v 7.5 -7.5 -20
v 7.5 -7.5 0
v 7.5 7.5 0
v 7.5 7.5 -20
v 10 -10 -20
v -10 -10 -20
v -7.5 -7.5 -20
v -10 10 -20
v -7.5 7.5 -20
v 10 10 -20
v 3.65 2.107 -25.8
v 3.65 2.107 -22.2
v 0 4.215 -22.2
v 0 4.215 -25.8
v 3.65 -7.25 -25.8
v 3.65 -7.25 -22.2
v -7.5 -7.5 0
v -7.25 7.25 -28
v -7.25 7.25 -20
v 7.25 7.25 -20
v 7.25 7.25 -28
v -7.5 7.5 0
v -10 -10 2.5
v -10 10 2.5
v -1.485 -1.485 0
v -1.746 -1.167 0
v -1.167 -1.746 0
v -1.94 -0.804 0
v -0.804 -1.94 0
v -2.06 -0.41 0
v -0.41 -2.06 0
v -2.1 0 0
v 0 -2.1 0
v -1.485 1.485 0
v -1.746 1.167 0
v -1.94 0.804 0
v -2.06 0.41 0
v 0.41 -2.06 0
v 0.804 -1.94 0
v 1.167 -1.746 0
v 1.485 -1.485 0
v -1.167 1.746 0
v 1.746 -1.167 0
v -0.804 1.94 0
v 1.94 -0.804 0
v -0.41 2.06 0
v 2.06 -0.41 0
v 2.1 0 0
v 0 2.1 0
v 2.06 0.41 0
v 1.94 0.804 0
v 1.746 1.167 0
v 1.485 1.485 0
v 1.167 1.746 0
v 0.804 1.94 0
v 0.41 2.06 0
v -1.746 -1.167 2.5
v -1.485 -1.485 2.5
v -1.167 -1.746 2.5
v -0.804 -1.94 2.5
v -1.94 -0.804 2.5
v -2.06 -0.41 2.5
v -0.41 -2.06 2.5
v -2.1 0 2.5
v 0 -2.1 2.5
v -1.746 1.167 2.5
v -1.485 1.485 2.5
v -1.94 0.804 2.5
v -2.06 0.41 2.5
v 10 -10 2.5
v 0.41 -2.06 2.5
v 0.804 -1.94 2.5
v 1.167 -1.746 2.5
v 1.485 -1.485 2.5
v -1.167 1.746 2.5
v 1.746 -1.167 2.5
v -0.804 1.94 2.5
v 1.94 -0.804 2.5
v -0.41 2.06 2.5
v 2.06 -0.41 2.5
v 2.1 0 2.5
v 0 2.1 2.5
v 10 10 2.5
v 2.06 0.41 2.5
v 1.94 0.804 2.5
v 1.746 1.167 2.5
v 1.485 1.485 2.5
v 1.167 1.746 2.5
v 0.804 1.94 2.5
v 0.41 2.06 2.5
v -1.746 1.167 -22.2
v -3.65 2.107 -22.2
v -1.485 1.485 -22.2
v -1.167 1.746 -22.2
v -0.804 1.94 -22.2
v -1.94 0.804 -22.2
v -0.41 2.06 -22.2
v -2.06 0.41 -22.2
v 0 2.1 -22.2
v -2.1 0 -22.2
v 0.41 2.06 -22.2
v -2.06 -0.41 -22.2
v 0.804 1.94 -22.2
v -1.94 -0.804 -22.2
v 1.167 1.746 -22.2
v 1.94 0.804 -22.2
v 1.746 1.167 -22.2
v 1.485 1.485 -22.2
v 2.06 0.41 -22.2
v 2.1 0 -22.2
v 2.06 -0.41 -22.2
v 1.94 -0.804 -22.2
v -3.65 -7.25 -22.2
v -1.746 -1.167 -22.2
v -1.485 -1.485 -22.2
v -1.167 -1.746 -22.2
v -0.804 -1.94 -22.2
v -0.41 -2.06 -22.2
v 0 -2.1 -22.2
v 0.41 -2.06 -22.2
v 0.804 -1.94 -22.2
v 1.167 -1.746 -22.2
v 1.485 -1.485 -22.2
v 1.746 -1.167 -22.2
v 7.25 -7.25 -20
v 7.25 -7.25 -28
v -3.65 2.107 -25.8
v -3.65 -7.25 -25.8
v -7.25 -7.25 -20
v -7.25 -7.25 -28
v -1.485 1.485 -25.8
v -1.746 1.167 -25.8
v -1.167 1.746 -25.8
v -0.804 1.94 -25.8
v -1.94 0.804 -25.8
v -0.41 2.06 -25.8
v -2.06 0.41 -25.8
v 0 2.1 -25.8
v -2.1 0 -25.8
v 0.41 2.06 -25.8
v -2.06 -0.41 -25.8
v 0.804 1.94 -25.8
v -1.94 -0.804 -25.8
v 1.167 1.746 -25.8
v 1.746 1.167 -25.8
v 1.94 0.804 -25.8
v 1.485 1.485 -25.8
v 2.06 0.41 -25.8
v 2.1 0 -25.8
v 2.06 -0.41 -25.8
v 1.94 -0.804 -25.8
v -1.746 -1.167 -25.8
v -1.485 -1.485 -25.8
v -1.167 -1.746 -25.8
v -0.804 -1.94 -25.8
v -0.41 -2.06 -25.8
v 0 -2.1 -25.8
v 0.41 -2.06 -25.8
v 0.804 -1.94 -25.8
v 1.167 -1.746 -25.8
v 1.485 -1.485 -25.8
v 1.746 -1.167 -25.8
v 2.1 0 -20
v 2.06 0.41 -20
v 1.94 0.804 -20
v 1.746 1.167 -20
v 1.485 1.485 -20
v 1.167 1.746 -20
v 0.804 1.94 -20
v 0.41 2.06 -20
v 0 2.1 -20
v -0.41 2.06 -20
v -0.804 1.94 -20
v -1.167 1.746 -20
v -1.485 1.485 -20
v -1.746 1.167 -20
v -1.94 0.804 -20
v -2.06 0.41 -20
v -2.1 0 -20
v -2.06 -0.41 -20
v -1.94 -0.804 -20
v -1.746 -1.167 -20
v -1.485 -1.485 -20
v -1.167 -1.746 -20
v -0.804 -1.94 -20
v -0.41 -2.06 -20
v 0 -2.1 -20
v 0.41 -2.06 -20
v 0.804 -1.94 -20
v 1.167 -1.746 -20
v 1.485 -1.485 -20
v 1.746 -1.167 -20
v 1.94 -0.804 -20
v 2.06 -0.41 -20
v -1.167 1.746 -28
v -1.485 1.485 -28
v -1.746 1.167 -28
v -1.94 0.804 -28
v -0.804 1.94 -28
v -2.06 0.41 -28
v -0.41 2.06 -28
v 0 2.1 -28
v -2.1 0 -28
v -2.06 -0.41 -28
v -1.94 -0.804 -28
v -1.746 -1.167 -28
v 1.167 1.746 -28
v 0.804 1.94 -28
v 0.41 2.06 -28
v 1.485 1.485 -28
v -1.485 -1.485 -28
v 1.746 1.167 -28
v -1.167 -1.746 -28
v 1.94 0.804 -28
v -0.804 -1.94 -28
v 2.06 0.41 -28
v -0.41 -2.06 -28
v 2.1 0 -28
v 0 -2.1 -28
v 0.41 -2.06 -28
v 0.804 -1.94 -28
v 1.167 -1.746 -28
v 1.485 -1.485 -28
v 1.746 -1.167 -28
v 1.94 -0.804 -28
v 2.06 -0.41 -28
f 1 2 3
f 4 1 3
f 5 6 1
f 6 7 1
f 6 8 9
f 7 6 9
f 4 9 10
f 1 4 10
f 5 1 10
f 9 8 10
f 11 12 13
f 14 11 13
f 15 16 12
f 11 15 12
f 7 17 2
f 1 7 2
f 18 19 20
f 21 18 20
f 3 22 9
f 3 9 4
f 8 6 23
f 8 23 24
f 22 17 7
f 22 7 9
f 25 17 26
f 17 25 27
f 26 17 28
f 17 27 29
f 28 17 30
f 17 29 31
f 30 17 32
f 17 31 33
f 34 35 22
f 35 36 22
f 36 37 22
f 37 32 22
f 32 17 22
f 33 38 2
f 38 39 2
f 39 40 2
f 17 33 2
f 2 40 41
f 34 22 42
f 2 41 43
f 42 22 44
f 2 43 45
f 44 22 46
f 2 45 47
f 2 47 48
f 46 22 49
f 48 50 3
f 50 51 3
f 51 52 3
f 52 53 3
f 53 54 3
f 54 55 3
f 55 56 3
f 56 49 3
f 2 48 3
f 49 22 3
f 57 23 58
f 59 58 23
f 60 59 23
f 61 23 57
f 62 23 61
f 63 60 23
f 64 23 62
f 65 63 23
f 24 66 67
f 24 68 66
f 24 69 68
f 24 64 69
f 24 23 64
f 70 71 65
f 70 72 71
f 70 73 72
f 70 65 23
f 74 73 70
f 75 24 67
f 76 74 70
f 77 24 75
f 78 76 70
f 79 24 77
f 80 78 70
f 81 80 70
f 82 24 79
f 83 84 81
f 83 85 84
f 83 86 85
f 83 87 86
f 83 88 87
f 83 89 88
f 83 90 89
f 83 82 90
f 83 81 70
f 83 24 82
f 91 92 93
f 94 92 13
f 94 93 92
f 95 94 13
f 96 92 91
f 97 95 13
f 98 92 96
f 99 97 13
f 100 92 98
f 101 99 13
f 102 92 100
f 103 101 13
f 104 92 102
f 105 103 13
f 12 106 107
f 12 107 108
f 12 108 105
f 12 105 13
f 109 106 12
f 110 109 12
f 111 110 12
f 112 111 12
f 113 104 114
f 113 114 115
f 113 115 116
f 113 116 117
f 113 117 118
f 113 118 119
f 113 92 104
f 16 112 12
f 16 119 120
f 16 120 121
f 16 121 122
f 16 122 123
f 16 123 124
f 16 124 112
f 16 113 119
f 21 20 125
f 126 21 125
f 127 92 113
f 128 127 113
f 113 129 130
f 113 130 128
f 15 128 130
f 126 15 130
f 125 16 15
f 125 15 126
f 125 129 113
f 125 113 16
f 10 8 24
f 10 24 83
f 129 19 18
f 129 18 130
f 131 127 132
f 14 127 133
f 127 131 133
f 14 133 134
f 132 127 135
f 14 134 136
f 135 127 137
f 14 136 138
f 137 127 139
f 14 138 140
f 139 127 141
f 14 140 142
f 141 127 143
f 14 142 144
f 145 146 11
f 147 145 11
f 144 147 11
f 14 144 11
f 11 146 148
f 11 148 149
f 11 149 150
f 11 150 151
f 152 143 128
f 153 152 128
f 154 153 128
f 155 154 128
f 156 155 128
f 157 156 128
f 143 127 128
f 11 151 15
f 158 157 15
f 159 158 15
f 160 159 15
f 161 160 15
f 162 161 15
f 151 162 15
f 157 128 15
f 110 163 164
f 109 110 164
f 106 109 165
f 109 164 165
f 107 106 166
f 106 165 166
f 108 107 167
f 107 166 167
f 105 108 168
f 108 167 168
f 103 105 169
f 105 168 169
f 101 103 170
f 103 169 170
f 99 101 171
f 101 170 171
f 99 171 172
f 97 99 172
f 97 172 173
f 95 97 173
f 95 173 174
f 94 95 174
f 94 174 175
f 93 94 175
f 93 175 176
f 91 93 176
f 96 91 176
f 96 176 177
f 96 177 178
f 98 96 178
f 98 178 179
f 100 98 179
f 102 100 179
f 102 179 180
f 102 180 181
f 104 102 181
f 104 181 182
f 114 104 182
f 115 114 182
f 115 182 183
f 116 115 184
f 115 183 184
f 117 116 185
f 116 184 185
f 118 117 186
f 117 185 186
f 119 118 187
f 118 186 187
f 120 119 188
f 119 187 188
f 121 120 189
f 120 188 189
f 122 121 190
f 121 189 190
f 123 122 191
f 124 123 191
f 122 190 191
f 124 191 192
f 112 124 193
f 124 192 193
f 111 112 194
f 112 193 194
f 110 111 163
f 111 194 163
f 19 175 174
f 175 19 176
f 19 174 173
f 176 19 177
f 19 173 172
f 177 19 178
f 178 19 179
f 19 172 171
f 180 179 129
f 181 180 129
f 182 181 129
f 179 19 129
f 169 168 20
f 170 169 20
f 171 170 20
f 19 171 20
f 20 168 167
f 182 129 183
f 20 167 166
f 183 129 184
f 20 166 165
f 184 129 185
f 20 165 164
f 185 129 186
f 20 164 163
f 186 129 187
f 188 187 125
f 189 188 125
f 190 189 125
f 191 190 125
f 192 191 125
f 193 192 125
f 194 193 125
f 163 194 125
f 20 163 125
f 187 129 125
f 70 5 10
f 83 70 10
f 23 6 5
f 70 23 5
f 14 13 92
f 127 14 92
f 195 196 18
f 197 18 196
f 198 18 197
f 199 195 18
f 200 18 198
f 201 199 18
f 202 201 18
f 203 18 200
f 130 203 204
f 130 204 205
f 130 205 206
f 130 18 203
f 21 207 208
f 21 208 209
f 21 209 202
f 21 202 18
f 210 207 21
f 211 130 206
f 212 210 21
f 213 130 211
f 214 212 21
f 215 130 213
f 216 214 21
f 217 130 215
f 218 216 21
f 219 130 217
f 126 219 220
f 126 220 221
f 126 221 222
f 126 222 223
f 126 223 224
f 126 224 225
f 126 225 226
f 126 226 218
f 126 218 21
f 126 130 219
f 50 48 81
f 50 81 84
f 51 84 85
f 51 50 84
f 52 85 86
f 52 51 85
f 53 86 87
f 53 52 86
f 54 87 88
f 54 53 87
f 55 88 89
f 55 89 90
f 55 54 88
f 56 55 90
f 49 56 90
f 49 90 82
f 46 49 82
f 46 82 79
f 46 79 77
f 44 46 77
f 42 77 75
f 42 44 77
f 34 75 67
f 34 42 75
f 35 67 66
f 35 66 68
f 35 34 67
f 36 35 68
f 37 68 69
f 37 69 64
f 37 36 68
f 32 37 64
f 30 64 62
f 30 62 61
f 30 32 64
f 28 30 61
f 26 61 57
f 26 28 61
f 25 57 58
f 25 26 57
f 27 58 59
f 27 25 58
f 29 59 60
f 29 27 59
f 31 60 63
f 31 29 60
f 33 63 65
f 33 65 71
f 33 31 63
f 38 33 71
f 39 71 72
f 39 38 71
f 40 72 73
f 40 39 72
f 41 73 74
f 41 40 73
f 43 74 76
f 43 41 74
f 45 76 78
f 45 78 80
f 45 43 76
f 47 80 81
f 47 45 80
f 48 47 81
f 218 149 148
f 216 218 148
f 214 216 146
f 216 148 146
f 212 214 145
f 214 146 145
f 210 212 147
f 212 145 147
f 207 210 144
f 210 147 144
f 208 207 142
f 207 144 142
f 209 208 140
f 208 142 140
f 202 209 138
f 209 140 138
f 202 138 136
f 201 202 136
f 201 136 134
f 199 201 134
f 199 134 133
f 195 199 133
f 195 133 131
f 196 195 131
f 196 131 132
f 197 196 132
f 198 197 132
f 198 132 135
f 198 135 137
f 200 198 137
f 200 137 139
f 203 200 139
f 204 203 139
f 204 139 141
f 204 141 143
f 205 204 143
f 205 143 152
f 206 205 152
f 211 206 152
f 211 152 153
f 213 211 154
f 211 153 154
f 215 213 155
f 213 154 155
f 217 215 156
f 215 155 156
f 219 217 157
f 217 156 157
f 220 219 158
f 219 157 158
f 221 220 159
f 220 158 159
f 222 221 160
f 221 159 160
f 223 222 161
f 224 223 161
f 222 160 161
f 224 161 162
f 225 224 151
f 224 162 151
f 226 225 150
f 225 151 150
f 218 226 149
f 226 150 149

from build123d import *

# Parameters (mm, degrees)
F0_W      = 20
F0_H      = 20
F0_W_2    = 15
F0_H_2    = 15
F0_R      = 2.1
F1_DEPTH  = 2.5
F2_DEPTH  = 20
F3_W      = 14.5
F3_H      = 14.5
F4_DEPTH  = 4
F6_DEPTH  = 1.7
F7_DEPTH  = 4
F8_DEPTH  = 5.7
F9_W      = 7.3
F9_H      = 3.6
F10_DEPTH = 7.2
F11_W     = 14.5
F11_H     = 14.5
F12_DEPTH = 2.2
F13_W     = 14.5
F13_H     = 14.5
F14_DEPTH = 2.2
F15_R     = 2.1
F16_DEPTH = 53.6


with BuildPart() as f1:
    # F0 (on Top) → F1 (new body)
    with BuildSketch(Plane.XY):
        Rectangle(F0_W, F0_H)
        Rectangle(F0_W_2, F0_H_2, mode=Mode.SUBTRACT)
        Rectangle(F0_W_2, F0_H_2)
        Circle(F0_R, mode=Mode.SUBTRACT)
    extrude(amount=F1_DEPTH)

    # F0 (on Top) → F2 (join)
    with BuildSketch(Plane.XY):
        Rectangle(F0_W, F0_H)
        Rectangle(F0_W_2, F0_H_2, mode=Mode.SUBTRACT)
    extrude(amount=-F2_DEPTH)


with BuildPart() as f4:
    # F3 (on face) → F4 (new body)
    with BuildSketch(Plane(origin=(0, 0, -20), x_dir=(1, 0, 0), z_dir=(0, 0, -1))):
        Rectangle(F3_W, F3_H)
        Polygon((0, -4.2146569651), (-3.65, -2.1073284825), (-3.65, 2.1073284825), (0, 4.2146569651), (3.65, 2.1073284825), (3.65, -2.1073284825), align=None, mode=Mode.SUBTRACT)
    extrude(amount=F4_DEPTH)

    # F5 (on face) → F6 (cut)
    with BuildSketch(Plane(origin=(0, 0, -24), x_dir=(1, 0, 0), z_dir=(0, 0, -1))):
        Polygon((0, -4.2146569651), (-3.65, -2.1073284825), (-3.65, -7.25), (3.65, -7.25), (3.65, -2.1073284825), align=None)
    extrude(amount=-F6_DEPTH, mode=Mode.SUBTRACT)

    # F7 (add): a face of the model
    f7_faces = [f4.faces().sort_by_distance(p)[0] for p in [
        (5.45, 7.0449390335, -24),
    ]]
    extrude(f7_faces, amount=F7_DEPTH)

    # F8 (add, through all): a face of the model
    f8_faces = [f4.faces().sort_by_distance(p)[0] for p in [
        (0, 5.160244615, -22.3),
    ]]
    extrude(f8_faces, amount=F8_DEPTH)

    # F9 (on face) → F10 (cut)
    with BuildSketch(Plane.XZ.offset(7.25)):
        with Locations((0, -24)):
            Rectangle(F9_W, F9_H)
    extrude(amount=-F10_DEPTH, mode=Mode.SUBTRACT)

    # F11 (on face) → F12 (join, through all)
    with BuildSketch(Plane(origin=(0, 0, -28), x_dir=(1, 0, 0), z_dir=(0, 0, -1))):
        Rectangle(F11_W, F11_H)
    extrude(amount=-F12_DEPTH)

    # F13 (on face) → F14 (join, through all)
    with BuildSketch(Plane.XY.offset(-20)):
        Rectangle(F13_W, F13_H)
    extrude(amount=-F14_DEPTH)

    # F15 (on face) → F16 (cut)
    with BuildSketch(Plane.XY.offset(2.5)):
        Circle(F15_R)
    extrude(amount=-F16_DEPTH, mode=Mode.SUBTRACT)


solid = Compound([f1.part, f4.part])
